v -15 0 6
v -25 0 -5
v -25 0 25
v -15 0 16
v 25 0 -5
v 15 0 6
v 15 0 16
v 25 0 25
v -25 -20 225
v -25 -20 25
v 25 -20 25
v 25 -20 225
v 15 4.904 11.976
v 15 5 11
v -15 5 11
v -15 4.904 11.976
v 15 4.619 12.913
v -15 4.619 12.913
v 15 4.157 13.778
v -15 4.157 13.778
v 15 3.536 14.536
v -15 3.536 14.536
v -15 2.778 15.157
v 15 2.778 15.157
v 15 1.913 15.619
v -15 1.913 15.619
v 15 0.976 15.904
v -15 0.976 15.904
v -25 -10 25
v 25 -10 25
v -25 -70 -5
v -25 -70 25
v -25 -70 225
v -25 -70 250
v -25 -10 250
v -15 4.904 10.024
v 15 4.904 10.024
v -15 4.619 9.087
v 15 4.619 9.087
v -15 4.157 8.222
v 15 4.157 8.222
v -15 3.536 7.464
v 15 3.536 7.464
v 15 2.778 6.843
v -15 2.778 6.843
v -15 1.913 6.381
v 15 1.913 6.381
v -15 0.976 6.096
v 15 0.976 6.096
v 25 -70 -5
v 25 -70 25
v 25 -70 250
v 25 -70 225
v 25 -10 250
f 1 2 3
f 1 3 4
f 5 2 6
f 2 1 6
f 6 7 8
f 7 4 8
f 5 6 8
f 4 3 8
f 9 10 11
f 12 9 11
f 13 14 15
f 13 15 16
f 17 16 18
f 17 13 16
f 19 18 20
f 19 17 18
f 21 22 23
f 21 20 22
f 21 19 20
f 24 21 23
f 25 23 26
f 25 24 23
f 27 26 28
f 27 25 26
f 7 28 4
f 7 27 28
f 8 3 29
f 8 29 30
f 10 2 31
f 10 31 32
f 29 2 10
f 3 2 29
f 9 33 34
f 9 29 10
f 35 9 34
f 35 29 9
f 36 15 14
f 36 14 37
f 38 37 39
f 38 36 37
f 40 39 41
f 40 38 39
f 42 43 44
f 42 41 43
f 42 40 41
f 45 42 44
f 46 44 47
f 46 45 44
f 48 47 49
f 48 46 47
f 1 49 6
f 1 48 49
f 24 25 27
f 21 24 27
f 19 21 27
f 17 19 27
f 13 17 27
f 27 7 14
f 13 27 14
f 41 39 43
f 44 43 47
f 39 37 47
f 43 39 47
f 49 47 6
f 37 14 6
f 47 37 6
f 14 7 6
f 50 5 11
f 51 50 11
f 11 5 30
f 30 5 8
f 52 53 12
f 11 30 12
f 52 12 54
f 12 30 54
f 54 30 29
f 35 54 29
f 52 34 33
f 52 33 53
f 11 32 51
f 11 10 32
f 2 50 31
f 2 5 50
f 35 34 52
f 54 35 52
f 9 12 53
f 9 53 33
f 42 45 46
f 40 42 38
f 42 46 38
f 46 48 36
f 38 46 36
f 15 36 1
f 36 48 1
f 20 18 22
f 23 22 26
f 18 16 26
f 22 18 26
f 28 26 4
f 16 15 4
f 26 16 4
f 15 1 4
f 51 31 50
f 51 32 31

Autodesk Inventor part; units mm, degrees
ref_plane "YZ Plane" through (0, 0, 0) normal (1, 0, 0) x (0, 1, 0)
ref_plane "XZ Plane" through (0, 0, 0) normal (0, 1, 0) x (-1, 0, 0)
ref_plane "XY Plane" through (0, 0, 0) normal (0, 0, 1) x (1, 0, 0)
sketch "Sketch1" plane through (0, 0, 0) normal (0, 1, 0) x (-1, 0, 0)
  line L0 (0, 0) -> (10, 0)
  circle A0 centre (10, 0) radius 1.5
  line L1 (0, 0) -> (-10, 0)
  circle A1 centre (-10, 0) radius 1.5
  line L2 (0, 0) -> (0, 6)
  line L3 (0, 6) -> (15, 6)
  line L4 (15, 6) -> (15, 16)
  line L5 (15, 16) -> (-15, 16)
  line L6 (-15, 16) -> (-15, 6)
  line L7 (-15, 6) -> (0, 6)
  dimension "d0" = 10
  dimension "d1" = 3
  dimension "d2" = 10
  dimension "d3" = 3
  dimension "d4" = 6
  dimension "d5" = 15
  dimension "d7" = 10
  dimension "d8" = 30
  dimension "d9" = 10
extrude "Extrusion1" add sketch "Sketch1" along normal blind 5 contours L7 L6 L5 L4 L3
fillet "Fillet1" radius 5 2 edges at (-7.5, 5, 6) (0, 5, 16)
sketch "Sketch2" plane through (0, 0, 0) normal (0, -1, 0) x (1, 0, 0)
  line L0 (0, 0) -> (0, -5)
  line L1 (0, -5) -> (-25, -5)
  line L2 (-25, -5) -> (-25, 25)
  line L3 (-25, 25) -> (25, 25)
  line L4 (25, 25) -> (25, -5)
  line L5 (25, -5) -> (0, -5)
  dimension "d13" = 5
  dimension "d14" = 25
  dimension "d15" = 30
  dimension "d16" = 50
  dimension "d17" = 30
extrude "Extrusion2" add sketch "Sketch2" along normal blind 70
sketch "Sketch3" plane through (-25, 0, 25) normal (0, 0, 1) x (1, 0, 0)
  line L0 (0, 0) -> (0, -70) projected
  line L1 (0, 0) -> (0, -20)
  line L2 (0, -20) -> (50, -20)
  line L3 (50, 0) -> (50, -70) projected
  line L4 (50, -20) -> (50, -10)
  line L5 (50, -10) -> (0, -10)
  point P0 (25, 0)
  dimension "d20" = 20
  dimension "d21" = 10
extrude "Extrusion3" add sketch "Sketch3" along normal blind 225
sketch "Sketch4" plane through (-25, -20, 25) normal (0, -1, 0) x (1, 0, 0)
  line L0 (50, 0) -> (50, 225) projected
  line L1 (50, 225) -> (50, 200)
  line L2 (50, 200) -> (0, 200)
  line L3 (0, 0) -> (0, 225) projected
  line L4 (0, 225) -> (0, 200)
  line L5 (0, 225) -> (50, 225)
  point P0 (25, -25)
  dimension "d24" = 25
extrude "Extrusion4" add sketch "Sketch4" along normal blind 50
properties part number "carSpacer"
